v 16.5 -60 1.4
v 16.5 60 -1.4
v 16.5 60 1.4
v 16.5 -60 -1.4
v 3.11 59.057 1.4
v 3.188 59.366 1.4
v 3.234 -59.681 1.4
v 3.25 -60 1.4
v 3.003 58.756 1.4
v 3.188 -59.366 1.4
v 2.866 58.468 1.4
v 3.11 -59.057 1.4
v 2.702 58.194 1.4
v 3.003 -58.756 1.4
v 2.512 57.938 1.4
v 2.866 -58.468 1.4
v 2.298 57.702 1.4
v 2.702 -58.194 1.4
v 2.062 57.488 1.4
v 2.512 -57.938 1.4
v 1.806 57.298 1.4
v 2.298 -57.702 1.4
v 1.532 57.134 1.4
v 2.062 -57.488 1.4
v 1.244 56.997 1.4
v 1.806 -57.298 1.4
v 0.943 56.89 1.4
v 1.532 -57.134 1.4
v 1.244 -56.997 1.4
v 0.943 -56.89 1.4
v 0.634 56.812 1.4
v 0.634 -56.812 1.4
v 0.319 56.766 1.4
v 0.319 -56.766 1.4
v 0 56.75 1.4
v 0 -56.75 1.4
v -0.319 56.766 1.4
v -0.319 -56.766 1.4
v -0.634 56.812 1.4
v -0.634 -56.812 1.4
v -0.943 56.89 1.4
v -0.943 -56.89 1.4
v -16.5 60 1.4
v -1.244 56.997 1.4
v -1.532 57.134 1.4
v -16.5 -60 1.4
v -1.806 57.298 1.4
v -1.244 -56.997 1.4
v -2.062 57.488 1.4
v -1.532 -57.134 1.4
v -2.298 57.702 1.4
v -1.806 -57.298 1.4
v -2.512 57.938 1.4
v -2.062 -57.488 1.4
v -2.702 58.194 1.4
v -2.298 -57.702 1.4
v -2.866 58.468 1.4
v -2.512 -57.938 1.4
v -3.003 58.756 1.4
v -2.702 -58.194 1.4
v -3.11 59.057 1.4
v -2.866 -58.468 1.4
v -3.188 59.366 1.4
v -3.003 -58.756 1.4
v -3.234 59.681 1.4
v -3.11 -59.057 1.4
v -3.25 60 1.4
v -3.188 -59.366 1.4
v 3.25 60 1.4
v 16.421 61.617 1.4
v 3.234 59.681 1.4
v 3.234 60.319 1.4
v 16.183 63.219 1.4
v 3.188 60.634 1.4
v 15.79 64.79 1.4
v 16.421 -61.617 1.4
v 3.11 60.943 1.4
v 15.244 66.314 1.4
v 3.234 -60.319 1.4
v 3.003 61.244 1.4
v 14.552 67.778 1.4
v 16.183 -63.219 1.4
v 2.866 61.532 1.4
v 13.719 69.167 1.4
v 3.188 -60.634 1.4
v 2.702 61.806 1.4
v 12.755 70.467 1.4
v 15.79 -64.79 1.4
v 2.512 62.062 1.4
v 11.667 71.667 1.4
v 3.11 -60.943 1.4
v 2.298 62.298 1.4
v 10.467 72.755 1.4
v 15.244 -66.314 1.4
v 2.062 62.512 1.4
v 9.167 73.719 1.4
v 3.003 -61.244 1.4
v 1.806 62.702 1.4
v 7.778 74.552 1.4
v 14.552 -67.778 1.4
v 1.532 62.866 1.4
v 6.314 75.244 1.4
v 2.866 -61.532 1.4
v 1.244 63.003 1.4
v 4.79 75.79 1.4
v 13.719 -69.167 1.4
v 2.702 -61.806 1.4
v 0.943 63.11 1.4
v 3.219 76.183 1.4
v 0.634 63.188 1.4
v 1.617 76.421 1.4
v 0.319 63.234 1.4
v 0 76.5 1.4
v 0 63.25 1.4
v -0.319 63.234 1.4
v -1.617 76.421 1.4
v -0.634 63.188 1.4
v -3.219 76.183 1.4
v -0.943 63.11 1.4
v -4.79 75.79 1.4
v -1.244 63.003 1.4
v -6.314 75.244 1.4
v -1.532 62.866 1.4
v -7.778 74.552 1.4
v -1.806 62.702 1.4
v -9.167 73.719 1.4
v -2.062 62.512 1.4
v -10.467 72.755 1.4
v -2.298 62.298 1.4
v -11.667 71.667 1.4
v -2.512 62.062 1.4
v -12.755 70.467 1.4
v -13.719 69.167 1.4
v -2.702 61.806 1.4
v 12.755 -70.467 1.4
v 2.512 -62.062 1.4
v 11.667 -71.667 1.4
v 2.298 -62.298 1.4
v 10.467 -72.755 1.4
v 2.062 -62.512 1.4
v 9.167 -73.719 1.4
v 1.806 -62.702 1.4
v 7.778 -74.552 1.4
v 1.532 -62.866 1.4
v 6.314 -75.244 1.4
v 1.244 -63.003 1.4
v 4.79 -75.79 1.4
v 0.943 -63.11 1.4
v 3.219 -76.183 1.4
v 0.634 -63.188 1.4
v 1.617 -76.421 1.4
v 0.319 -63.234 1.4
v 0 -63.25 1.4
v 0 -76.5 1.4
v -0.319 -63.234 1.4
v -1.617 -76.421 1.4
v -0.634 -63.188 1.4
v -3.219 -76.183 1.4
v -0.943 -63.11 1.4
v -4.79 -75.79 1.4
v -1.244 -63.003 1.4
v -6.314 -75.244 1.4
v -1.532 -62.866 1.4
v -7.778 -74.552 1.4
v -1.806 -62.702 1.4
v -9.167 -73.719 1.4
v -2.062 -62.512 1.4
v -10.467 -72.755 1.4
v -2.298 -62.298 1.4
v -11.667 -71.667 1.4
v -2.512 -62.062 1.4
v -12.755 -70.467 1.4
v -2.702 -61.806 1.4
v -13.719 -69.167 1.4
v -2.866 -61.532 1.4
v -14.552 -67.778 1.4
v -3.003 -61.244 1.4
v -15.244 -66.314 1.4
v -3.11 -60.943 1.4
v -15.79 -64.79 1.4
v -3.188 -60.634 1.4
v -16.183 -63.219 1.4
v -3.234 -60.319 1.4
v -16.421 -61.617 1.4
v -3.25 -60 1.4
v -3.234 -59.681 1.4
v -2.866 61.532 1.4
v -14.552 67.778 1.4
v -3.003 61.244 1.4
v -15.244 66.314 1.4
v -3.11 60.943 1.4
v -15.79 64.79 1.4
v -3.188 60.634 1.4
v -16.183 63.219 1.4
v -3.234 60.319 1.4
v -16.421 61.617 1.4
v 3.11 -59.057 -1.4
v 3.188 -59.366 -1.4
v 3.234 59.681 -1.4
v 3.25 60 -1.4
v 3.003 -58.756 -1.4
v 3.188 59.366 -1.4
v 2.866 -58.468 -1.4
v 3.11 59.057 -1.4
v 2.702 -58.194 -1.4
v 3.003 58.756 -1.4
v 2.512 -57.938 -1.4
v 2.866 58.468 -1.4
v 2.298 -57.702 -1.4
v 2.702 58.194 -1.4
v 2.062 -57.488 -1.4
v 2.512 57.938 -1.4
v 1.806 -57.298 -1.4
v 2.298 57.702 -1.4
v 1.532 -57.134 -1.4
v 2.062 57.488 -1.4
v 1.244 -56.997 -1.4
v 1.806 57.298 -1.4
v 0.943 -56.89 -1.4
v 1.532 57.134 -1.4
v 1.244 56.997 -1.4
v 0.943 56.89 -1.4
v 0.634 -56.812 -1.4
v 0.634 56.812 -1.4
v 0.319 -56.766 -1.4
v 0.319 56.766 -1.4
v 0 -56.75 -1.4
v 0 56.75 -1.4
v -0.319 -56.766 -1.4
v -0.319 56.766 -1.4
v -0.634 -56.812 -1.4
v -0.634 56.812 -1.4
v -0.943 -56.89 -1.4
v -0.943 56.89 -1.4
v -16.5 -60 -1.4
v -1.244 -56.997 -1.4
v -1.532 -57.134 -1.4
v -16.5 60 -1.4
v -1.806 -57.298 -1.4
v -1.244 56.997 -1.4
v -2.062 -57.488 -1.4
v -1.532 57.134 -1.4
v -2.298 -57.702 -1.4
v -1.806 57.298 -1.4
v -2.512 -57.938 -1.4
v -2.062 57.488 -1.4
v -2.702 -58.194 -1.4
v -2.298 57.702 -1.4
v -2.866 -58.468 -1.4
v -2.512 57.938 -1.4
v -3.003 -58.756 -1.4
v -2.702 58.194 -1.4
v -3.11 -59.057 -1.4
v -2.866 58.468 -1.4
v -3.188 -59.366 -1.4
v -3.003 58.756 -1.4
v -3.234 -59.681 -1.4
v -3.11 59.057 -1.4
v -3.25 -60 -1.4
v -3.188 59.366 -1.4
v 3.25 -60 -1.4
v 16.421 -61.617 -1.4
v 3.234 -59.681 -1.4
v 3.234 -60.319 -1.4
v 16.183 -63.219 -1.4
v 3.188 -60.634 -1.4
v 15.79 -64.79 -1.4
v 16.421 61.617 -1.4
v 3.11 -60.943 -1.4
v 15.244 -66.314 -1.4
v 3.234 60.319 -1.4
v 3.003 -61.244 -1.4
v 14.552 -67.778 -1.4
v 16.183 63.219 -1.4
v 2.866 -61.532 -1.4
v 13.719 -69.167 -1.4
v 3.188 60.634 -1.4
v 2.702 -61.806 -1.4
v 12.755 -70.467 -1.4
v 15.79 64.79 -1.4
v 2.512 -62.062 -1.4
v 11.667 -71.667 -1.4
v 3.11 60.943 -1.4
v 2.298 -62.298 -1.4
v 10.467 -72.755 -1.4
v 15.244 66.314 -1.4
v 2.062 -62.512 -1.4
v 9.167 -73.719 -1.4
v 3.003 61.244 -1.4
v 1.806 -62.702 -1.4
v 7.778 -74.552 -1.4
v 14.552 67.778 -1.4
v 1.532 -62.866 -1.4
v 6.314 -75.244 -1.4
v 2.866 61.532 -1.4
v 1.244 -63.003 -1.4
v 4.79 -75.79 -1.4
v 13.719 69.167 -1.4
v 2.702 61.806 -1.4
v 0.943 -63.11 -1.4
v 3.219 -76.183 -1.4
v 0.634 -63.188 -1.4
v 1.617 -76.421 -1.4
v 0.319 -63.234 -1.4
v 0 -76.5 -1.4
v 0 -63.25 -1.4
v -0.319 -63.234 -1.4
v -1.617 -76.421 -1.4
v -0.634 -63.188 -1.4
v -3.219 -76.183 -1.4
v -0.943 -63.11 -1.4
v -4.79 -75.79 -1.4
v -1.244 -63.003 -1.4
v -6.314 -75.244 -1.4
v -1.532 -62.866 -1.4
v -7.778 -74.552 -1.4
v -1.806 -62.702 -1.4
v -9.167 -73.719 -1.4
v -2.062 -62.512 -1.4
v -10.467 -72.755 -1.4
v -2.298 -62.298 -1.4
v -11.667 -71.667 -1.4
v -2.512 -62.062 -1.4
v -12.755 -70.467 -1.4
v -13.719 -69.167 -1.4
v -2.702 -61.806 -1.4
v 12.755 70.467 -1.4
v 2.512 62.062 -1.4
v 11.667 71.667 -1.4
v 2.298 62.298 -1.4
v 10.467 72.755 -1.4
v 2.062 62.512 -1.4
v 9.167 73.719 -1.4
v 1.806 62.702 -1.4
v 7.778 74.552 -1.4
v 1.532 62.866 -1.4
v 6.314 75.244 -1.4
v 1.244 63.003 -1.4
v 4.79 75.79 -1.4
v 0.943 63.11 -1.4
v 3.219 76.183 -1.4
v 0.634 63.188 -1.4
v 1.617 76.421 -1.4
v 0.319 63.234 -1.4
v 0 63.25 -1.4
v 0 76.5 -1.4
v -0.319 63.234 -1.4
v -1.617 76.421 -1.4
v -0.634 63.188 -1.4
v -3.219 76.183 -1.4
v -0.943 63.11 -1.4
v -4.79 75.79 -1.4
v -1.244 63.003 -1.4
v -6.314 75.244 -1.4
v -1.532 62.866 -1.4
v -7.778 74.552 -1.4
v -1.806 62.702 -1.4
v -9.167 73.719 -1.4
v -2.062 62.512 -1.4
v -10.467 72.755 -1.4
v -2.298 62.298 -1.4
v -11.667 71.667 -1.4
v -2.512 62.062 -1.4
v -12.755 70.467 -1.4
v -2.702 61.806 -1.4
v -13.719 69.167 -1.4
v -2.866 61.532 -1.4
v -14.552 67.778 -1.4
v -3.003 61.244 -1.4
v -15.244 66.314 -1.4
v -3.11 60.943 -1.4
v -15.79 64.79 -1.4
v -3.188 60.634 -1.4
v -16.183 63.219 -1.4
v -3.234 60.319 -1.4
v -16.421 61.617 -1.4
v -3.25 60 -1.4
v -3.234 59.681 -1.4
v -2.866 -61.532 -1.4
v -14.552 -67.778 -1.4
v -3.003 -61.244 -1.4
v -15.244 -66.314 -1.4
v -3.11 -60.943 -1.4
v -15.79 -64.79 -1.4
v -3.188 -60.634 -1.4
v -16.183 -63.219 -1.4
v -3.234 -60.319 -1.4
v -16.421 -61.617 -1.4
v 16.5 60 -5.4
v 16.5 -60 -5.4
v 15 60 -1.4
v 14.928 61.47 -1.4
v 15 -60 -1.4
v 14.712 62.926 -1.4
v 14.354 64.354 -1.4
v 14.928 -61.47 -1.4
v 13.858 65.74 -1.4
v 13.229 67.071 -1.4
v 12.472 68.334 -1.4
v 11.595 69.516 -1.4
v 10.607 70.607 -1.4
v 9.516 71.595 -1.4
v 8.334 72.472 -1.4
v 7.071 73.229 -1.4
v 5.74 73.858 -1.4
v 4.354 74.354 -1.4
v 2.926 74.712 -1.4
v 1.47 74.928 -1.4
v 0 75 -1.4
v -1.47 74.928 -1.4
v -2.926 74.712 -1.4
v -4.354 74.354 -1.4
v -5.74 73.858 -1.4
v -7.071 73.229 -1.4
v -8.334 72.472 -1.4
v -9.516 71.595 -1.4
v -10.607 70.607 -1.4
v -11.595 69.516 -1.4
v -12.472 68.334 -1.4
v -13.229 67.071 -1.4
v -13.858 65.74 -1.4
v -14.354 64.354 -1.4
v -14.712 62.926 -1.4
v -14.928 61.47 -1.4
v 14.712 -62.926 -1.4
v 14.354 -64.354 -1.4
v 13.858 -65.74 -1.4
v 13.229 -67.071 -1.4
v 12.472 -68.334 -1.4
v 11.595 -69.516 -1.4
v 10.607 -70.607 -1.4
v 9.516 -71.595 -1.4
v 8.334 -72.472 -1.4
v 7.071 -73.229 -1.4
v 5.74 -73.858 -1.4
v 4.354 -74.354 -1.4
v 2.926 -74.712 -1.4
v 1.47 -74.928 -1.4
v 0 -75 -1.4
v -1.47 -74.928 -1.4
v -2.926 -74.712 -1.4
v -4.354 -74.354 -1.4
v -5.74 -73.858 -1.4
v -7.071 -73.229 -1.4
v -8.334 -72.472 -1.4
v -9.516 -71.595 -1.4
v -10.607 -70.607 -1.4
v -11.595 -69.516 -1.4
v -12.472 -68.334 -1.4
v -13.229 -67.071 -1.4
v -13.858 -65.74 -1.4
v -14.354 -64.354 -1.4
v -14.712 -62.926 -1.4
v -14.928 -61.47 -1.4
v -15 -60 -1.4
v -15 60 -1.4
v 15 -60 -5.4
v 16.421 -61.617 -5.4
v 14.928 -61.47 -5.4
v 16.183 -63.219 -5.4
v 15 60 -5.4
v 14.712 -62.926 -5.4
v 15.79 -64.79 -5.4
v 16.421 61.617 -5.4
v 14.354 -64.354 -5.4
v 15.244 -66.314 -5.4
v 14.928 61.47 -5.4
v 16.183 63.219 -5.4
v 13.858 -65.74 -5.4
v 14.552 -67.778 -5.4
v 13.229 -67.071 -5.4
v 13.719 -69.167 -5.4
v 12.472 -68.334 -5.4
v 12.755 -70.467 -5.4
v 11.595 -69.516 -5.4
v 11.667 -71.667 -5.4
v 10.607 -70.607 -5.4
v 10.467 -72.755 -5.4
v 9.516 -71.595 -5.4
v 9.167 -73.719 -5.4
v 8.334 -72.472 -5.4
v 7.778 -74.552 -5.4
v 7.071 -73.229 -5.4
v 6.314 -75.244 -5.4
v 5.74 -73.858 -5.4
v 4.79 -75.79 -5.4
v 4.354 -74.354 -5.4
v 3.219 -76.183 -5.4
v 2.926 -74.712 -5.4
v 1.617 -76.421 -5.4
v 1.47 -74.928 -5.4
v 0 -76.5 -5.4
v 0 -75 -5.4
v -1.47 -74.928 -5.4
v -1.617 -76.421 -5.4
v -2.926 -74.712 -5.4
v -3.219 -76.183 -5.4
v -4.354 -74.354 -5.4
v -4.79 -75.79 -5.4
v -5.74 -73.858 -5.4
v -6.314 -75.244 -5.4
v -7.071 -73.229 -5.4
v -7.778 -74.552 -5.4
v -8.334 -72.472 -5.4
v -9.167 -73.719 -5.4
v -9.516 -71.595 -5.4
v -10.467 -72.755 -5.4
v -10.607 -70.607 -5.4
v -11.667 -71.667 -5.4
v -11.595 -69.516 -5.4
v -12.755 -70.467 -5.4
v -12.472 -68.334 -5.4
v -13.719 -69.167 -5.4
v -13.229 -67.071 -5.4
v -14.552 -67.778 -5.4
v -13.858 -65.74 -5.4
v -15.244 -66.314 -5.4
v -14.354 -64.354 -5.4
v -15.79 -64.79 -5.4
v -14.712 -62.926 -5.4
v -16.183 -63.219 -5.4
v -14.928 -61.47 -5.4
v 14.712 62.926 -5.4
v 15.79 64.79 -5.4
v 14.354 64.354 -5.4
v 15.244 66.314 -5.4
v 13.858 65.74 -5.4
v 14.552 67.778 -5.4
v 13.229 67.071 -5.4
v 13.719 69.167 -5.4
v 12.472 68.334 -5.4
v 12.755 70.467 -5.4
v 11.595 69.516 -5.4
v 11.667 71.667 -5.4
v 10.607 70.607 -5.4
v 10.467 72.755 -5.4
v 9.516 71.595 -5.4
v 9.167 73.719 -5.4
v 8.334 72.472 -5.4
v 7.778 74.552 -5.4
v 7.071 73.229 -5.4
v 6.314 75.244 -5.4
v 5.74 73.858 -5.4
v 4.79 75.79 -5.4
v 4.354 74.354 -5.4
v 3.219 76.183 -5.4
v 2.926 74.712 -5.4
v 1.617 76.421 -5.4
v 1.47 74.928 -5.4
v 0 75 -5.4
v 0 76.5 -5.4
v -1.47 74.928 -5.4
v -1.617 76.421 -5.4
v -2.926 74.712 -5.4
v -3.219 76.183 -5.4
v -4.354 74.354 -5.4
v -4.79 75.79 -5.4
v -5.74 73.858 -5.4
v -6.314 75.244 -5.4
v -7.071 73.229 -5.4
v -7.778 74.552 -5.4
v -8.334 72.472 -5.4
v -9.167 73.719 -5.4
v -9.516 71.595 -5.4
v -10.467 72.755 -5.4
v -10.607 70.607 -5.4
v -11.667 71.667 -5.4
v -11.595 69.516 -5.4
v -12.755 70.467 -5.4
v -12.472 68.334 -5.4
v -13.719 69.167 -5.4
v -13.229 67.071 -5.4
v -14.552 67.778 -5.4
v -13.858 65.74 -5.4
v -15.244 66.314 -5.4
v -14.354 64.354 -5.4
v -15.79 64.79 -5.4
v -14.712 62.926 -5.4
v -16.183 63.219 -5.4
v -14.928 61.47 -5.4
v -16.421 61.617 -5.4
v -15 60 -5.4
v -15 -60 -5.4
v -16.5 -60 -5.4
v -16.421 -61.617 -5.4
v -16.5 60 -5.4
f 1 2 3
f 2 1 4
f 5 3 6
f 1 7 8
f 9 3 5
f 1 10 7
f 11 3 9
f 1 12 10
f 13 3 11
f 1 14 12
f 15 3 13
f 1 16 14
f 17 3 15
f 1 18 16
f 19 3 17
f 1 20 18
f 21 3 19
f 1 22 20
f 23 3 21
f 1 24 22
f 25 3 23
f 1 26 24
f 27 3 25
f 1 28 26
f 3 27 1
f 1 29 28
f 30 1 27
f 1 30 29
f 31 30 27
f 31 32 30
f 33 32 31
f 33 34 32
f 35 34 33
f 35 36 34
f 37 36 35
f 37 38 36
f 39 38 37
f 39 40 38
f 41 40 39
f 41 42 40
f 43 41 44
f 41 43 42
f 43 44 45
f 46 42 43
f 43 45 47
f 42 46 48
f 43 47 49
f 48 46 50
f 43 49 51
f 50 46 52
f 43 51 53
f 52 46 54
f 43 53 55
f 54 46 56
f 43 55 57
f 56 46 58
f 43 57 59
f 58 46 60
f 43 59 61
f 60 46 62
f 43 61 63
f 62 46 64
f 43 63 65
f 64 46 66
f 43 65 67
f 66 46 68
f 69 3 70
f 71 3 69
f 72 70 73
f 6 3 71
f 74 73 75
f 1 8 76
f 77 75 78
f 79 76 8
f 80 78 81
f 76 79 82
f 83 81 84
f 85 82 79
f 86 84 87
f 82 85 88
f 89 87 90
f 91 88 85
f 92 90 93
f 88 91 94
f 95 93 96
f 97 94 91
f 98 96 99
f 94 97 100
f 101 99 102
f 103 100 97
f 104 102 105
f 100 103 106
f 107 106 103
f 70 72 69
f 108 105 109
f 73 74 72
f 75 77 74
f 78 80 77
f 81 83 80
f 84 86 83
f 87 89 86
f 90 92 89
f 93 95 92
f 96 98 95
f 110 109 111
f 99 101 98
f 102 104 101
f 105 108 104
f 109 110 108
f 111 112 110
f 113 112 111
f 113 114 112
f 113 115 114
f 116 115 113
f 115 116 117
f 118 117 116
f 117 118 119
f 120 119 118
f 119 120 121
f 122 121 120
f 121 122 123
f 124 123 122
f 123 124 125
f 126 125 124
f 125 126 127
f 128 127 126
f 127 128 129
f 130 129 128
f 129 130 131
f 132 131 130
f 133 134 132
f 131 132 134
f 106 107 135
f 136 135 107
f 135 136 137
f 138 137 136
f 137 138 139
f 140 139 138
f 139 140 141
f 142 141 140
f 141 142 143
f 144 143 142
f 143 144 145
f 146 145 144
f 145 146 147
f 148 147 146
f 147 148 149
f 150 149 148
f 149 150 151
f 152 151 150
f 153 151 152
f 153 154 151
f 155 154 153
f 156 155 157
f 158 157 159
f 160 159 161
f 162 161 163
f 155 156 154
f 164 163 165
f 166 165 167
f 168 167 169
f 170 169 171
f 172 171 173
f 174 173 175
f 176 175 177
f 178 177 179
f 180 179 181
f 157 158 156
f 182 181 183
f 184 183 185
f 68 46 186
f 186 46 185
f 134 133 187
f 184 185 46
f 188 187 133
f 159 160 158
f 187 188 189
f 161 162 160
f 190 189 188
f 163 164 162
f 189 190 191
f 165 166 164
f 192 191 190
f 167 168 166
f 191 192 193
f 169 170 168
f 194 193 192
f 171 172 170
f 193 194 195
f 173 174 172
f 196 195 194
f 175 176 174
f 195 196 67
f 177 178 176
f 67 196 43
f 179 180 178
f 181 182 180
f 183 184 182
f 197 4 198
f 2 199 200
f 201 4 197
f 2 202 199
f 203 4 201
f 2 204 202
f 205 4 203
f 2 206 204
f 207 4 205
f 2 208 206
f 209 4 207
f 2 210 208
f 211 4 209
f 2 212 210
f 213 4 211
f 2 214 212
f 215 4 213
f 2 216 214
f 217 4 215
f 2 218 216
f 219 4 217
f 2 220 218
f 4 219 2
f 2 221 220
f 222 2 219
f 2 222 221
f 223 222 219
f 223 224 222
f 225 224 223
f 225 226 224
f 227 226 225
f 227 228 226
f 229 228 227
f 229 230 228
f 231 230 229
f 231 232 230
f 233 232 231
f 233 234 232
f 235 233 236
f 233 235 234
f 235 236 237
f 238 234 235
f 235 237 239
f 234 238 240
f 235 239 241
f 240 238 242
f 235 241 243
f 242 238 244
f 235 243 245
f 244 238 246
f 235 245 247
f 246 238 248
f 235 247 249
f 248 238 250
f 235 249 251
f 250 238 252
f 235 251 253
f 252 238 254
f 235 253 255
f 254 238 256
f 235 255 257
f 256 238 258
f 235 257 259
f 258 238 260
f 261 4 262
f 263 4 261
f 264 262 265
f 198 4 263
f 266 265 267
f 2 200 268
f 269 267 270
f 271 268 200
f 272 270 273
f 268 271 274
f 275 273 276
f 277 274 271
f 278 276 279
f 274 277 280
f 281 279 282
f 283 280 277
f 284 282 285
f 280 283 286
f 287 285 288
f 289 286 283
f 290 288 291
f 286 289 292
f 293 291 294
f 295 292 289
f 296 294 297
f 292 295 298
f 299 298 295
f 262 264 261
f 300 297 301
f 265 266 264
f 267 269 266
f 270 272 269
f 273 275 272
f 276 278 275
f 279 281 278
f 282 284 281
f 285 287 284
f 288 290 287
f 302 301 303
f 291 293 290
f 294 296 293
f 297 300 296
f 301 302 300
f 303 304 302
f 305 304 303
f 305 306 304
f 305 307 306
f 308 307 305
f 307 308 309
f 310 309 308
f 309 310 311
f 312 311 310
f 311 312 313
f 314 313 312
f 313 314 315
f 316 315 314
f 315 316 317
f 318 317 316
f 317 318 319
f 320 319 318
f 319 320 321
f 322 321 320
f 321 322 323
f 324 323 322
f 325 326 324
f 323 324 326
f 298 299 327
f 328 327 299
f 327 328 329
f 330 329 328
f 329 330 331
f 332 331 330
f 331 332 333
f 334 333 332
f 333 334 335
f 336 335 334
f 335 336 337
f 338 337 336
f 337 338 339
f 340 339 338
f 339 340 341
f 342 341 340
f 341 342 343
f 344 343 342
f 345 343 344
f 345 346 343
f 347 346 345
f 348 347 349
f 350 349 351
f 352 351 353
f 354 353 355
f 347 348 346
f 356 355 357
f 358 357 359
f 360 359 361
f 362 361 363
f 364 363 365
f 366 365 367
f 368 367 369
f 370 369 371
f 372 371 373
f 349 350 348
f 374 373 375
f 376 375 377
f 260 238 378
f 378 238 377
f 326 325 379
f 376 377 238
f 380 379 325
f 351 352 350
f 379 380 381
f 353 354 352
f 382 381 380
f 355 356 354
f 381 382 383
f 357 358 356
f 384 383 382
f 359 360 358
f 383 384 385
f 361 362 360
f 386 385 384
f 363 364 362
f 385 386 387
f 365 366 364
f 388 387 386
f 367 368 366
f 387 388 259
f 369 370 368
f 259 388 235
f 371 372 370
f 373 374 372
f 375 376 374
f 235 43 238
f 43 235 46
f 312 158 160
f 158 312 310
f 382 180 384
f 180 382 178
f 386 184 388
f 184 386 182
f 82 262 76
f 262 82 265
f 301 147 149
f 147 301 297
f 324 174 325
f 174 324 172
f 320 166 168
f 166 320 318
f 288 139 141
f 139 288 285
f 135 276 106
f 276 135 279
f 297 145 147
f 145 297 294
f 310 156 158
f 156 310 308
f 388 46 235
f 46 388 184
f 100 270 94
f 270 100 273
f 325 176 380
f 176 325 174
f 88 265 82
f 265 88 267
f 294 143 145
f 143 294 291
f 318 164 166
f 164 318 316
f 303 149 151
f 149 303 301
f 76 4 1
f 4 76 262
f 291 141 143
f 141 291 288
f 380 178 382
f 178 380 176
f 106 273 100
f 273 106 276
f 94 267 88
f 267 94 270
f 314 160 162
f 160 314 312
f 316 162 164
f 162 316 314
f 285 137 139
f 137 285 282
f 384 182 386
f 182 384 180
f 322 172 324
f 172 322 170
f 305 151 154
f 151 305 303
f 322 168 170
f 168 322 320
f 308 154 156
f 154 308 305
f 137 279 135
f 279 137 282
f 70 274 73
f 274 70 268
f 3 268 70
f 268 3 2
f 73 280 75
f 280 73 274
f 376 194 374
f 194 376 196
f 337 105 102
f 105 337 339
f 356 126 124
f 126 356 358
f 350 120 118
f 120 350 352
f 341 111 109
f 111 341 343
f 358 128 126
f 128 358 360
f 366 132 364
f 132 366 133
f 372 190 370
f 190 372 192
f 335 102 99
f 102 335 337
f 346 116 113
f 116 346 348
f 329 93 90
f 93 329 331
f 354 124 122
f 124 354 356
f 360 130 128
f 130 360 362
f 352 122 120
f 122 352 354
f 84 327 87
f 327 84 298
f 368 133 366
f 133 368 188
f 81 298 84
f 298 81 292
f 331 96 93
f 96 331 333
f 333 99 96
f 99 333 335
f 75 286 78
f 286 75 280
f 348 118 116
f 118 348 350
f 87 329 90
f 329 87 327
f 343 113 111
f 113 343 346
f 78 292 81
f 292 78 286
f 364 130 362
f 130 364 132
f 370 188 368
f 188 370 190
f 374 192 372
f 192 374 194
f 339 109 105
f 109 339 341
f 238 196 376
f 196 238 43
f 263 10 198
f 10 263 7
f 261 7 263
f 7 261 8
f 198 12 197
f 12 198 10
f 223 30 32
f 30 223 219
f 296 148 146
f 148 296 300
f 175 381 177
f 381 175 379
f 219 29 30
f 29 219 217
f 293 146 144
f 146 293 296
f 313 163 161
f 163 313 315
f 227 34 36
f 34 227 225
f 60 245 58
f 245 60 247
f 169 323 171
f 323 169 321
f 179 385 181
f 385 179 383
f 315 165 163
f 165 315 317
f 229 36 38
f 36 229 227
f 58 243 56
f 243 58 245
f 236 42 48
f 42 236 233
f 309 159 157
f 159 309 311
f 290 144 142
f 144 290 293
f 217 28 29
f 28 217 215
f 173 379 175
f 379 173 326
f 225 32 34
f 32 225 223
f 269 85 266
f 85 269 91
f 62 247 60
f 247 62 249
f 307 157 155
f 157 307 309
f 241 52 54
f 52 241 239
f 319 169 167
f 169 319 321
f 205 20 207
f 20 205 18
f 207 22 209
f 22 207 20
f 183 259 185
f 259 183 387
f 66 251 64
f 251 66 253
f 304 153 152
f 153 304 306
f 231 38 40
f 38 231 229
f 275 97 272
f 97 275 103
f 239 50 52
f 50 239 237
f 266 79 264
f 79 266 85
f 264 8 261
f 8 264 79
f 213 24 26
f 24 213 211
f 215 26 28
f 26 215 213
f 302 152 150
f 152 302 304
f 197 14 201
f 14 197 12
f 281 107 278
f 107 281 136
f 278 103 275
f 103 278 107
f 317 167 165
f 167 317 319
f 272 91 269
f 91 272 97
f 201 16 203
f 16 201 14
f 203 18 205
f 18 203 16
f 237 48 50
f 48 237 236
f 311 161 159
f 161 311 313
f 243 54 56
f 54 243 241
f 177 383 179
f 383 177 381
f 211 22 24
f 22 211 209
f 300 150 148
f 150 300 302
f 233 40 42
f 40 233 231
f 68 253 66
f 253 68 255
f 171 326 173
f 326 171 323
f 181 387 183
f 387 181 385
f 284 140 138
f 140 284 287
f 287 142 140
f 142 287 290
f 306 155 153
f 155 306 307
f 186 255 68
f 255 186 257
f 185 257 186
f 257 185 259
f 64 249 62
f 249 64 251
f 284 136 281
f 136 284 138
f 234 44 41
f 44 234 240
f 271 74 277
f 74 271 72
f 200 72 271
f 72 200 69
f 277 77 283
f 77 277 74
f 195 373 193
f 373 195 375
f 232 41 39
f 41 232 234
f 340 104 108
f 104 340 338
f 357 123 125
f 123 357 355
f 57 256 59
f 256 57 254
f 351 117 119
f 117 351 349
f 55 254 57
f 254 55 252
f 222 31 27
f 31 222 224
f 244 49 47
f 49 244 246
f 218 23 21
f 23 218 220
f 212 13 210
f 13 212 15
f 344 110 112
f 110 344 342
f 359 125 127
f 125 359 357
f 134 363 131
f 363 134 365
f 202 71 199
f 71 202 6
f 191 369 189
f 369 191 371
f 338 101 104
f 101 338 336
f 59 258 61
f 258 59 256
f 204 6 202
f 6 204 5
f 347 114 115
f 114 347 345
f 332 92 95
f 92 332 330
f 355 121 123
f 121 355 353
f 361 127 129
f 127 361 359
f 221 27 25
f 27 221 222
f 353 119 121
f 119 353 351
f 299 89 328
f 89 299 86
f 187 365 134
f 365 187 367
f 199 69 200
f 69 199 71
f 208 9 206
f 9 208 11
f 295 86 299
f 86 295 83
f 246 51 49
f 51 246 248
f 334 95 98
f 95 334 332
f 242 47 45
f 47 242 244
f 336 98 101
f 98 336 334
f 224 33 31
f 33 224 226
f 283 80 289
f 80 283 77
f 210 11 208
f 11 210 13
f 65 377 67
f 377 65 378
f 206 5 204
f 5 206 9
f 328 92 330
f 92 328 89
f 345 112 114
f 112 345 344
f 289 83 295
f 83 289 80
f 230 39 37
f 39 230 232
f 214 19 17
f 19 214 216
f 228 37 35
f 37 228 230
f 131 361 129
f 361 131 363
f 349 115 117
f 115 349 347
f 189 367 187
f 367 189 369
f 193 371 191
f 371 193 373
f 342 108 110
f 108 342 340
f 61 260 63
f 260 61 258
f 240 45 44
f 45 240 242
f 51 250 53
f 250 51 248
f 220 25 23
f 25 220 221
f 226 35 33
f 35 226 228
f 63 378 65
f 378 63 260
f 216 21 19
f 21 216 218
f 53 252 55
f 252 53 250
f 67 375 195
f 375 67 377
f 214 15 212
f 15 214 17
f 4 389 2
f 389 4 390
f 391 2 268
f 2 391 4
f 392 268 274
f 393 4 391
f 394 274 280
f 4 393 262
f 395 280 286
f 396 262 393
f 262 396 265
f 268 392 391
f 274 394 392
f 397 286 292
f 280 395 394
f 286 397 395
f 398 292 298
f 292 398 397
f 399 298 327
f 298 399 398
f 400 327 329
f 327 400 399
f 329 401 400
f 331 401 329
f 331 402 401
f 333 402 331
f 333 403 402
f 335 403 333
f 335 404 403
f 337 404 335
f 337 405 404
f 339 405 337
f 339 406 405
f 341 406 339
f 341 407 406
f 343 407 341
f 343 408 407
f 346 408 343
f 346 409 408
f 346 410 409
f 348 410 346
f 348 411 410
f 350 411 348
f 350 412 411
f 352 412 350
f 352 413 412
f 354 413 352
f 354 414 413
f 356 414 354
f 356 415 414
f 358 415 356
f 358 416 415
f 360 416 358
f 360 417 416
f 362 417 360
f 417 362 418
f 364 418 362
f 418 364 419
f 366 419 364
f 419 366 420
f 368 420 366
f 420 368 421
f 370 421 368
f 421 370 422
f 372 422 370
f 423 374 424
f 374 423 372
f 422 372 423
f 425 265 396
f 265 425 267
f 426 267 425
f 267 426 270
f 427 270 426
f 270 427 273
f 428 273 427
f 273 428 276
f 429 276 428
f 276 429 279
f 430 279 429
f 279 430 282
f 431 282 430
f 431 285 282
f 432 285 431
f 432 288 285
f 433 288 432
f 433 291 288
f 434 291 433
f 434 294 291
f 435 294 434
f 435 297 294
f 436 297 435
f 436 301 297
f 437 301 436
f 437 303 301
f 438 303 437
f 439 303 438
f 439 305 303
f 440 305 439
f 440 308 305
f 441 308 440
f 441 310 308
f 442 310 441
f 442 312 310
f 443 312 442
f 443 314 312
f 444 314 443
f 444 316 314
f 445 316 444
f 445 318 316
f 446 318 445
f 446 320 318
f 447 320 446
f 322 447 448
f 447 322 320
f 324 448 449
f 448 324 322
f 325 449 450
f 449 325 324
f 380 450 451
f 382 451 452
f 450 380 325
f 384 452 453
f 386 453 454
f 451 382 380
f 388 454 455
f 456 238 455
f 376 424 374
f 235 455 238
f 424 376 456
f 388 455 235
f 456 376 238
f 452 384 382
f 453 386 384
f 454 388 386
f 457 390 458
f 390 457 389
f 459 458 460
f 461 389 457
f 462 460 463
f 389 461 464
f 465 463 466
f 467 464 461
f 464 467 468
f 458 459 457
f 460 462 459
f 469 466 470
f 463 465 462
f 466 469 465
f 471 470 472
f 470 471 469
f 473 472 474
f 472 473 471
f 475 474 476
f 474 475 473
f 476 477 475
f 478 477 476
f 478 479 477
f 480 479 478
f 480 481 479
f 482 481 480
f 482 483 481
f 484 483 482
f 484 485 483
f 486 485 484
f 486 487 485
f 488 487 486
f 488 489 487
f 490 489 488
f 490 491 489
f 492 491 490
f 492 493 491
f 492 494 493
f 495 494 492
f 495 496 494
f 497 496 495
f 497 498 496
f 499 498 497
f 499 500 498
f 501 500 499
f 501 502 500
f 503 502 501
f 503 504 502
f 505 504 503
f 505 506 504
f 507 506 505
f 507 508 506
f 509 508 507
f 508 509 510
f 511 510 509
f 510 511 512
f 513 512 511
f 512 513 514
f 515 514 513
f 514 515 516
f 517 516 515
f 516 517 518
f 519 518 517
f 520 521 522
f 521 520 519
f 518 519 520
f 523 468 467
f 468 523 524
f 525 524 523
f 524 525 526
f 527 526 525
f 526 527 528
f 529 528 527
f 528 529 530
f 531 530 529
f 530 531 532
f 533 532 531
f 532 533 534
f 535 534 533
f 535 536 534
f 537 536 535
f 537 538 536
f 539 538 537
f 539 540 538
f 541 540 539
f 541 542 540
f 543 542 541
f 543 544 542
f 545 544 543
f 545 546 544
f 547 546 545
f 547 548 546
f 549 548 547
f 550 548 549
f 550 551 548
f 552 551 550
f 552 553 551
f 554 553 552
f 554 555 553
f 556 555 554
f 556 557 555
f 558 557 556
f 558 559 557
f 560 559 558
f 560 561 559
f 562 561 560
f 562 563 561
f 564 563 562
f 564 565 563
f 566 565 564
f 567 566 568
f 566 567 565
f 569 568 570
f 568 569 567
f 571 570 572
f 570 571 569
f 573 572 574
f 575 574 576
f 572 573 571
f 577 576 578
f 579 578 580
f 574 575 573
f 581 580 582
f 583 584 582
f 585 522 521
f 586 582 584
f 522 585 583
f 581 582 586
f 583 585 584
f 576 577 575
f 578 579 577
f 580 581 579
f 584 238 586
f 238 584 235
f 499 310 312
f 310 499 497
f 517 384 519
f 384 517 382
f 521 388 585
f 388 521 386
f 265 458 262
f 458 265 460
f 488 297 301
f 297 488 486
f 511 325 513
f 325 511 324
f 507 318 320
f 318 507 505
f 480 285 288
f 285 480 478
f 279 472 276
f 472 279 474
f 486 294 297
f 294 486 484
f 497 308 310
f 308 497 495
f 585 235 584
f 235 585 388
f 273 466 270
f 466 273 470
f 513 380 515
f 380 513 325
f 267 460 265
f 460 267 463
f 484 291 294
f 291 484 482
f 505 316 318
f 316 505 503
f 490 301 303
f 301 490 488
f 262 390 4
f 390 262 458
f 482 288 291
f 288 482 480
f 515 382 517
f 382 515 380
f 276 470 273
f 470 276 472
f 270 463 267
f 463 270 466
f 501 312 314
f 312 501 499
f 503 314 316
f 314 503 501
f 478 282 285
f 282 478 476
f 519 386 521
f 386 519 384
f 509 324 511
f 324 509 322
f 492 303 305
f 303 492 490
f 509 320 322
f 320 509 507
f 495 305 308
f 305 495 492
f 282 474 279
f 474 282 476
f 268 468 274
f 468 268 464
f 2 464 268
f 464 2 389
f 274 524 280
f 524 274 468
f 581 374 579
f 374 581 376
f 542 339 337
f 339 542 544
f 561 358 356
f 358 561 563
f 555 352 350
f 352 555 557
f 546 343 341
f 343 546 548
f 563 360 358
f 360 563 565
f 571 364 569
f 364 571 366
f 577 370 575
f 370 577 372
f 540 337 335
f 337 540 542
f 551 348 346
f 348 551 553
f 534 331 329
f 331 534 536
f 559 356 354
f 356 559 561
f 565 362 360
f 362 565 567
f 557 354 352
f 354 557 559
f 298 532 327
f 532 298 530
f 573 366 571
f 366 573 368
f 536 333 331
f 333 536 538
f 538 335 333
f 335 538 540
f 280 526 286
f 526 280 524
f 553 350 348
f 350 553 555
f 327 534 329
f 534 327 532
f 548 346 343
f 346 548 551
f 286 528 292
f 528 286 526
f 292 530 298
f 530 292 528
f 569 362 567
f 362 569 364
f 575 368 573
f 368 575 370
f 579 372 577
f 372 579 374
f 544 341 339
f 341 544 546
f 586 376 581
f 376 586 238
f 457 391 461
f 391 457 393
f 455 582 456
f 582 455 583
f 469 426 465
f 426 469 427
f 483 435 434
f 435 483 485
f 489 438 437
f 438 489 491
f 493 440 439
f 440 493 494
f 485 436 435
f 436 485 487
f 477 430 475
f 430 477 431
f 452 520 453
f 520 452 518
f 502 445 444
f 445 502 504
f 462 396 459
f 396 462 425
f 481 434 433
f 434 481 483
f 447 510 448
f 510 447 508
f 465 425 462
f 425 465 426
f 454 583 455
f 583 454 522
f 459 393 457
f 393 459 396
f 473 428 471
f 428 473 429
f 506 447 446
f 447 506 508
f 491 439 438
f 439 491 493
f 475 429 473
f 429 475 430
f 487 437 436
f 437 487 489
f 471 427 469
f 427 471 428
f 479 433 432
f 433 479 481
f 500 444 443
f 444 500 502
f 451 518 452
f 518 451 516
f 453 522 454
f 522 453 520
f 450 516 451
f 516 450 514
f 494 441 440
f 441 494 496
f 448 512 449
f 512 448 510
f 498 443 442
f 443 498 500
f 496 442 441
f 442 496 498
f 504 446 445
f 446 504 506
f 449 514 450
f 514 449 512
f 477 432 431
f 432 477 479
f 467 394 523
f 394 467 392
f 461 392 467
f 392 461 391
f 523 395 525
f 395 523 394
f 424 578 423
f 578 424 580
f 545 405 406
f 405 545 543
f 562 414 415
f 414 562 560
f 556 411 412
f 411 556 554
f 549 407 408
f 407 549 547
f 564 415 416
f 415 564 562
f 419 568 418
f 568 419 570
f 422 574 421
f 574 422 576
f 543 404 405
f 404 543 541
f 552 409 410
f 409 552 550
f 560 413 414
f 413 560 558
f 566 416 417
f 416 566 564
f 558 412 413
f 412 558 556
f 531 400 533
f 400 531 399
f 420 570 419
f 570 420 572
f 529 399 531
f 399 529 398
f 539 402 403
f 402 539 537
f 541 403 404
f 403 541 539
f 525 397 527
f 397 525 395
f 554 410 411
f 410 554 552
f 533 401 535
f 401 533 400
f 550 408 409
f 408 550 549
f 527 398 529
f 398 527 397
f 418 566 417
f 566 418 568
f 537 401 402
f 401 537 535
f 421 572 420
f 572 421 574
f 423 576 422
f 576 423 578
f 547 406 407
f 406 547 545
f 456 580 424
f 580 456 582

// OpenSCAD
// file: rib.scad
include <plate_twin_lasers.scad>



module rib(rib_depth, rib_height){
    difference(){
        plate (plate_depth=rib_height);
        translate([0,0,0])
        cube([plate_width-rib_depth, plate_len, rib_height+1], center=true);
        color("red")
        translate([0, -plate_len/2,0])
        cylinder(h=rib_height+1, d=plate_width-rib_depth, center=true);
        color("green")
        translate([0,plate_len/2,0])
        cylinder(h=rib_height+1, d=plate_width-rib_depth, center=true);
    }
}
// file: plate_twin_lasers.scad
$fn=64;

plate_depth_new=2.8;
plate_len=120;
plate_width=33;

module plate(plate_depth){
difference(){
    base(plate_depth);
    holes();
}
}
module holes(){
    translate([0,-plate_len/2,0])
    cylinder(h=40, d=6.5, center=true);
    translate([0,plate_len/2,0])
     cylinder(h=40, d=6.5, center=true);
}
module base(plate_depth){
    cube([plate_width,plate_len,plate_depth], center=true);
    color("red");
    translate([0,-plate_len/2,0])
    cylinder(h=plate_depth, d=plate_width, center=true);
    color("green")
    translate([0,plate_len/2,0])
    cylinder(h=plate_depth,d=plate_width, center=true);
}
// main file
include <plate_twin_lasers.scad>
include <rib.scad>

rib_height_new = 4;

plate(plate_depth_new);
translate([0,0,-plate_depth_new/2 - rib_height_new/2])
rib(rib_depth=3, rib_height=rib_height_new);
